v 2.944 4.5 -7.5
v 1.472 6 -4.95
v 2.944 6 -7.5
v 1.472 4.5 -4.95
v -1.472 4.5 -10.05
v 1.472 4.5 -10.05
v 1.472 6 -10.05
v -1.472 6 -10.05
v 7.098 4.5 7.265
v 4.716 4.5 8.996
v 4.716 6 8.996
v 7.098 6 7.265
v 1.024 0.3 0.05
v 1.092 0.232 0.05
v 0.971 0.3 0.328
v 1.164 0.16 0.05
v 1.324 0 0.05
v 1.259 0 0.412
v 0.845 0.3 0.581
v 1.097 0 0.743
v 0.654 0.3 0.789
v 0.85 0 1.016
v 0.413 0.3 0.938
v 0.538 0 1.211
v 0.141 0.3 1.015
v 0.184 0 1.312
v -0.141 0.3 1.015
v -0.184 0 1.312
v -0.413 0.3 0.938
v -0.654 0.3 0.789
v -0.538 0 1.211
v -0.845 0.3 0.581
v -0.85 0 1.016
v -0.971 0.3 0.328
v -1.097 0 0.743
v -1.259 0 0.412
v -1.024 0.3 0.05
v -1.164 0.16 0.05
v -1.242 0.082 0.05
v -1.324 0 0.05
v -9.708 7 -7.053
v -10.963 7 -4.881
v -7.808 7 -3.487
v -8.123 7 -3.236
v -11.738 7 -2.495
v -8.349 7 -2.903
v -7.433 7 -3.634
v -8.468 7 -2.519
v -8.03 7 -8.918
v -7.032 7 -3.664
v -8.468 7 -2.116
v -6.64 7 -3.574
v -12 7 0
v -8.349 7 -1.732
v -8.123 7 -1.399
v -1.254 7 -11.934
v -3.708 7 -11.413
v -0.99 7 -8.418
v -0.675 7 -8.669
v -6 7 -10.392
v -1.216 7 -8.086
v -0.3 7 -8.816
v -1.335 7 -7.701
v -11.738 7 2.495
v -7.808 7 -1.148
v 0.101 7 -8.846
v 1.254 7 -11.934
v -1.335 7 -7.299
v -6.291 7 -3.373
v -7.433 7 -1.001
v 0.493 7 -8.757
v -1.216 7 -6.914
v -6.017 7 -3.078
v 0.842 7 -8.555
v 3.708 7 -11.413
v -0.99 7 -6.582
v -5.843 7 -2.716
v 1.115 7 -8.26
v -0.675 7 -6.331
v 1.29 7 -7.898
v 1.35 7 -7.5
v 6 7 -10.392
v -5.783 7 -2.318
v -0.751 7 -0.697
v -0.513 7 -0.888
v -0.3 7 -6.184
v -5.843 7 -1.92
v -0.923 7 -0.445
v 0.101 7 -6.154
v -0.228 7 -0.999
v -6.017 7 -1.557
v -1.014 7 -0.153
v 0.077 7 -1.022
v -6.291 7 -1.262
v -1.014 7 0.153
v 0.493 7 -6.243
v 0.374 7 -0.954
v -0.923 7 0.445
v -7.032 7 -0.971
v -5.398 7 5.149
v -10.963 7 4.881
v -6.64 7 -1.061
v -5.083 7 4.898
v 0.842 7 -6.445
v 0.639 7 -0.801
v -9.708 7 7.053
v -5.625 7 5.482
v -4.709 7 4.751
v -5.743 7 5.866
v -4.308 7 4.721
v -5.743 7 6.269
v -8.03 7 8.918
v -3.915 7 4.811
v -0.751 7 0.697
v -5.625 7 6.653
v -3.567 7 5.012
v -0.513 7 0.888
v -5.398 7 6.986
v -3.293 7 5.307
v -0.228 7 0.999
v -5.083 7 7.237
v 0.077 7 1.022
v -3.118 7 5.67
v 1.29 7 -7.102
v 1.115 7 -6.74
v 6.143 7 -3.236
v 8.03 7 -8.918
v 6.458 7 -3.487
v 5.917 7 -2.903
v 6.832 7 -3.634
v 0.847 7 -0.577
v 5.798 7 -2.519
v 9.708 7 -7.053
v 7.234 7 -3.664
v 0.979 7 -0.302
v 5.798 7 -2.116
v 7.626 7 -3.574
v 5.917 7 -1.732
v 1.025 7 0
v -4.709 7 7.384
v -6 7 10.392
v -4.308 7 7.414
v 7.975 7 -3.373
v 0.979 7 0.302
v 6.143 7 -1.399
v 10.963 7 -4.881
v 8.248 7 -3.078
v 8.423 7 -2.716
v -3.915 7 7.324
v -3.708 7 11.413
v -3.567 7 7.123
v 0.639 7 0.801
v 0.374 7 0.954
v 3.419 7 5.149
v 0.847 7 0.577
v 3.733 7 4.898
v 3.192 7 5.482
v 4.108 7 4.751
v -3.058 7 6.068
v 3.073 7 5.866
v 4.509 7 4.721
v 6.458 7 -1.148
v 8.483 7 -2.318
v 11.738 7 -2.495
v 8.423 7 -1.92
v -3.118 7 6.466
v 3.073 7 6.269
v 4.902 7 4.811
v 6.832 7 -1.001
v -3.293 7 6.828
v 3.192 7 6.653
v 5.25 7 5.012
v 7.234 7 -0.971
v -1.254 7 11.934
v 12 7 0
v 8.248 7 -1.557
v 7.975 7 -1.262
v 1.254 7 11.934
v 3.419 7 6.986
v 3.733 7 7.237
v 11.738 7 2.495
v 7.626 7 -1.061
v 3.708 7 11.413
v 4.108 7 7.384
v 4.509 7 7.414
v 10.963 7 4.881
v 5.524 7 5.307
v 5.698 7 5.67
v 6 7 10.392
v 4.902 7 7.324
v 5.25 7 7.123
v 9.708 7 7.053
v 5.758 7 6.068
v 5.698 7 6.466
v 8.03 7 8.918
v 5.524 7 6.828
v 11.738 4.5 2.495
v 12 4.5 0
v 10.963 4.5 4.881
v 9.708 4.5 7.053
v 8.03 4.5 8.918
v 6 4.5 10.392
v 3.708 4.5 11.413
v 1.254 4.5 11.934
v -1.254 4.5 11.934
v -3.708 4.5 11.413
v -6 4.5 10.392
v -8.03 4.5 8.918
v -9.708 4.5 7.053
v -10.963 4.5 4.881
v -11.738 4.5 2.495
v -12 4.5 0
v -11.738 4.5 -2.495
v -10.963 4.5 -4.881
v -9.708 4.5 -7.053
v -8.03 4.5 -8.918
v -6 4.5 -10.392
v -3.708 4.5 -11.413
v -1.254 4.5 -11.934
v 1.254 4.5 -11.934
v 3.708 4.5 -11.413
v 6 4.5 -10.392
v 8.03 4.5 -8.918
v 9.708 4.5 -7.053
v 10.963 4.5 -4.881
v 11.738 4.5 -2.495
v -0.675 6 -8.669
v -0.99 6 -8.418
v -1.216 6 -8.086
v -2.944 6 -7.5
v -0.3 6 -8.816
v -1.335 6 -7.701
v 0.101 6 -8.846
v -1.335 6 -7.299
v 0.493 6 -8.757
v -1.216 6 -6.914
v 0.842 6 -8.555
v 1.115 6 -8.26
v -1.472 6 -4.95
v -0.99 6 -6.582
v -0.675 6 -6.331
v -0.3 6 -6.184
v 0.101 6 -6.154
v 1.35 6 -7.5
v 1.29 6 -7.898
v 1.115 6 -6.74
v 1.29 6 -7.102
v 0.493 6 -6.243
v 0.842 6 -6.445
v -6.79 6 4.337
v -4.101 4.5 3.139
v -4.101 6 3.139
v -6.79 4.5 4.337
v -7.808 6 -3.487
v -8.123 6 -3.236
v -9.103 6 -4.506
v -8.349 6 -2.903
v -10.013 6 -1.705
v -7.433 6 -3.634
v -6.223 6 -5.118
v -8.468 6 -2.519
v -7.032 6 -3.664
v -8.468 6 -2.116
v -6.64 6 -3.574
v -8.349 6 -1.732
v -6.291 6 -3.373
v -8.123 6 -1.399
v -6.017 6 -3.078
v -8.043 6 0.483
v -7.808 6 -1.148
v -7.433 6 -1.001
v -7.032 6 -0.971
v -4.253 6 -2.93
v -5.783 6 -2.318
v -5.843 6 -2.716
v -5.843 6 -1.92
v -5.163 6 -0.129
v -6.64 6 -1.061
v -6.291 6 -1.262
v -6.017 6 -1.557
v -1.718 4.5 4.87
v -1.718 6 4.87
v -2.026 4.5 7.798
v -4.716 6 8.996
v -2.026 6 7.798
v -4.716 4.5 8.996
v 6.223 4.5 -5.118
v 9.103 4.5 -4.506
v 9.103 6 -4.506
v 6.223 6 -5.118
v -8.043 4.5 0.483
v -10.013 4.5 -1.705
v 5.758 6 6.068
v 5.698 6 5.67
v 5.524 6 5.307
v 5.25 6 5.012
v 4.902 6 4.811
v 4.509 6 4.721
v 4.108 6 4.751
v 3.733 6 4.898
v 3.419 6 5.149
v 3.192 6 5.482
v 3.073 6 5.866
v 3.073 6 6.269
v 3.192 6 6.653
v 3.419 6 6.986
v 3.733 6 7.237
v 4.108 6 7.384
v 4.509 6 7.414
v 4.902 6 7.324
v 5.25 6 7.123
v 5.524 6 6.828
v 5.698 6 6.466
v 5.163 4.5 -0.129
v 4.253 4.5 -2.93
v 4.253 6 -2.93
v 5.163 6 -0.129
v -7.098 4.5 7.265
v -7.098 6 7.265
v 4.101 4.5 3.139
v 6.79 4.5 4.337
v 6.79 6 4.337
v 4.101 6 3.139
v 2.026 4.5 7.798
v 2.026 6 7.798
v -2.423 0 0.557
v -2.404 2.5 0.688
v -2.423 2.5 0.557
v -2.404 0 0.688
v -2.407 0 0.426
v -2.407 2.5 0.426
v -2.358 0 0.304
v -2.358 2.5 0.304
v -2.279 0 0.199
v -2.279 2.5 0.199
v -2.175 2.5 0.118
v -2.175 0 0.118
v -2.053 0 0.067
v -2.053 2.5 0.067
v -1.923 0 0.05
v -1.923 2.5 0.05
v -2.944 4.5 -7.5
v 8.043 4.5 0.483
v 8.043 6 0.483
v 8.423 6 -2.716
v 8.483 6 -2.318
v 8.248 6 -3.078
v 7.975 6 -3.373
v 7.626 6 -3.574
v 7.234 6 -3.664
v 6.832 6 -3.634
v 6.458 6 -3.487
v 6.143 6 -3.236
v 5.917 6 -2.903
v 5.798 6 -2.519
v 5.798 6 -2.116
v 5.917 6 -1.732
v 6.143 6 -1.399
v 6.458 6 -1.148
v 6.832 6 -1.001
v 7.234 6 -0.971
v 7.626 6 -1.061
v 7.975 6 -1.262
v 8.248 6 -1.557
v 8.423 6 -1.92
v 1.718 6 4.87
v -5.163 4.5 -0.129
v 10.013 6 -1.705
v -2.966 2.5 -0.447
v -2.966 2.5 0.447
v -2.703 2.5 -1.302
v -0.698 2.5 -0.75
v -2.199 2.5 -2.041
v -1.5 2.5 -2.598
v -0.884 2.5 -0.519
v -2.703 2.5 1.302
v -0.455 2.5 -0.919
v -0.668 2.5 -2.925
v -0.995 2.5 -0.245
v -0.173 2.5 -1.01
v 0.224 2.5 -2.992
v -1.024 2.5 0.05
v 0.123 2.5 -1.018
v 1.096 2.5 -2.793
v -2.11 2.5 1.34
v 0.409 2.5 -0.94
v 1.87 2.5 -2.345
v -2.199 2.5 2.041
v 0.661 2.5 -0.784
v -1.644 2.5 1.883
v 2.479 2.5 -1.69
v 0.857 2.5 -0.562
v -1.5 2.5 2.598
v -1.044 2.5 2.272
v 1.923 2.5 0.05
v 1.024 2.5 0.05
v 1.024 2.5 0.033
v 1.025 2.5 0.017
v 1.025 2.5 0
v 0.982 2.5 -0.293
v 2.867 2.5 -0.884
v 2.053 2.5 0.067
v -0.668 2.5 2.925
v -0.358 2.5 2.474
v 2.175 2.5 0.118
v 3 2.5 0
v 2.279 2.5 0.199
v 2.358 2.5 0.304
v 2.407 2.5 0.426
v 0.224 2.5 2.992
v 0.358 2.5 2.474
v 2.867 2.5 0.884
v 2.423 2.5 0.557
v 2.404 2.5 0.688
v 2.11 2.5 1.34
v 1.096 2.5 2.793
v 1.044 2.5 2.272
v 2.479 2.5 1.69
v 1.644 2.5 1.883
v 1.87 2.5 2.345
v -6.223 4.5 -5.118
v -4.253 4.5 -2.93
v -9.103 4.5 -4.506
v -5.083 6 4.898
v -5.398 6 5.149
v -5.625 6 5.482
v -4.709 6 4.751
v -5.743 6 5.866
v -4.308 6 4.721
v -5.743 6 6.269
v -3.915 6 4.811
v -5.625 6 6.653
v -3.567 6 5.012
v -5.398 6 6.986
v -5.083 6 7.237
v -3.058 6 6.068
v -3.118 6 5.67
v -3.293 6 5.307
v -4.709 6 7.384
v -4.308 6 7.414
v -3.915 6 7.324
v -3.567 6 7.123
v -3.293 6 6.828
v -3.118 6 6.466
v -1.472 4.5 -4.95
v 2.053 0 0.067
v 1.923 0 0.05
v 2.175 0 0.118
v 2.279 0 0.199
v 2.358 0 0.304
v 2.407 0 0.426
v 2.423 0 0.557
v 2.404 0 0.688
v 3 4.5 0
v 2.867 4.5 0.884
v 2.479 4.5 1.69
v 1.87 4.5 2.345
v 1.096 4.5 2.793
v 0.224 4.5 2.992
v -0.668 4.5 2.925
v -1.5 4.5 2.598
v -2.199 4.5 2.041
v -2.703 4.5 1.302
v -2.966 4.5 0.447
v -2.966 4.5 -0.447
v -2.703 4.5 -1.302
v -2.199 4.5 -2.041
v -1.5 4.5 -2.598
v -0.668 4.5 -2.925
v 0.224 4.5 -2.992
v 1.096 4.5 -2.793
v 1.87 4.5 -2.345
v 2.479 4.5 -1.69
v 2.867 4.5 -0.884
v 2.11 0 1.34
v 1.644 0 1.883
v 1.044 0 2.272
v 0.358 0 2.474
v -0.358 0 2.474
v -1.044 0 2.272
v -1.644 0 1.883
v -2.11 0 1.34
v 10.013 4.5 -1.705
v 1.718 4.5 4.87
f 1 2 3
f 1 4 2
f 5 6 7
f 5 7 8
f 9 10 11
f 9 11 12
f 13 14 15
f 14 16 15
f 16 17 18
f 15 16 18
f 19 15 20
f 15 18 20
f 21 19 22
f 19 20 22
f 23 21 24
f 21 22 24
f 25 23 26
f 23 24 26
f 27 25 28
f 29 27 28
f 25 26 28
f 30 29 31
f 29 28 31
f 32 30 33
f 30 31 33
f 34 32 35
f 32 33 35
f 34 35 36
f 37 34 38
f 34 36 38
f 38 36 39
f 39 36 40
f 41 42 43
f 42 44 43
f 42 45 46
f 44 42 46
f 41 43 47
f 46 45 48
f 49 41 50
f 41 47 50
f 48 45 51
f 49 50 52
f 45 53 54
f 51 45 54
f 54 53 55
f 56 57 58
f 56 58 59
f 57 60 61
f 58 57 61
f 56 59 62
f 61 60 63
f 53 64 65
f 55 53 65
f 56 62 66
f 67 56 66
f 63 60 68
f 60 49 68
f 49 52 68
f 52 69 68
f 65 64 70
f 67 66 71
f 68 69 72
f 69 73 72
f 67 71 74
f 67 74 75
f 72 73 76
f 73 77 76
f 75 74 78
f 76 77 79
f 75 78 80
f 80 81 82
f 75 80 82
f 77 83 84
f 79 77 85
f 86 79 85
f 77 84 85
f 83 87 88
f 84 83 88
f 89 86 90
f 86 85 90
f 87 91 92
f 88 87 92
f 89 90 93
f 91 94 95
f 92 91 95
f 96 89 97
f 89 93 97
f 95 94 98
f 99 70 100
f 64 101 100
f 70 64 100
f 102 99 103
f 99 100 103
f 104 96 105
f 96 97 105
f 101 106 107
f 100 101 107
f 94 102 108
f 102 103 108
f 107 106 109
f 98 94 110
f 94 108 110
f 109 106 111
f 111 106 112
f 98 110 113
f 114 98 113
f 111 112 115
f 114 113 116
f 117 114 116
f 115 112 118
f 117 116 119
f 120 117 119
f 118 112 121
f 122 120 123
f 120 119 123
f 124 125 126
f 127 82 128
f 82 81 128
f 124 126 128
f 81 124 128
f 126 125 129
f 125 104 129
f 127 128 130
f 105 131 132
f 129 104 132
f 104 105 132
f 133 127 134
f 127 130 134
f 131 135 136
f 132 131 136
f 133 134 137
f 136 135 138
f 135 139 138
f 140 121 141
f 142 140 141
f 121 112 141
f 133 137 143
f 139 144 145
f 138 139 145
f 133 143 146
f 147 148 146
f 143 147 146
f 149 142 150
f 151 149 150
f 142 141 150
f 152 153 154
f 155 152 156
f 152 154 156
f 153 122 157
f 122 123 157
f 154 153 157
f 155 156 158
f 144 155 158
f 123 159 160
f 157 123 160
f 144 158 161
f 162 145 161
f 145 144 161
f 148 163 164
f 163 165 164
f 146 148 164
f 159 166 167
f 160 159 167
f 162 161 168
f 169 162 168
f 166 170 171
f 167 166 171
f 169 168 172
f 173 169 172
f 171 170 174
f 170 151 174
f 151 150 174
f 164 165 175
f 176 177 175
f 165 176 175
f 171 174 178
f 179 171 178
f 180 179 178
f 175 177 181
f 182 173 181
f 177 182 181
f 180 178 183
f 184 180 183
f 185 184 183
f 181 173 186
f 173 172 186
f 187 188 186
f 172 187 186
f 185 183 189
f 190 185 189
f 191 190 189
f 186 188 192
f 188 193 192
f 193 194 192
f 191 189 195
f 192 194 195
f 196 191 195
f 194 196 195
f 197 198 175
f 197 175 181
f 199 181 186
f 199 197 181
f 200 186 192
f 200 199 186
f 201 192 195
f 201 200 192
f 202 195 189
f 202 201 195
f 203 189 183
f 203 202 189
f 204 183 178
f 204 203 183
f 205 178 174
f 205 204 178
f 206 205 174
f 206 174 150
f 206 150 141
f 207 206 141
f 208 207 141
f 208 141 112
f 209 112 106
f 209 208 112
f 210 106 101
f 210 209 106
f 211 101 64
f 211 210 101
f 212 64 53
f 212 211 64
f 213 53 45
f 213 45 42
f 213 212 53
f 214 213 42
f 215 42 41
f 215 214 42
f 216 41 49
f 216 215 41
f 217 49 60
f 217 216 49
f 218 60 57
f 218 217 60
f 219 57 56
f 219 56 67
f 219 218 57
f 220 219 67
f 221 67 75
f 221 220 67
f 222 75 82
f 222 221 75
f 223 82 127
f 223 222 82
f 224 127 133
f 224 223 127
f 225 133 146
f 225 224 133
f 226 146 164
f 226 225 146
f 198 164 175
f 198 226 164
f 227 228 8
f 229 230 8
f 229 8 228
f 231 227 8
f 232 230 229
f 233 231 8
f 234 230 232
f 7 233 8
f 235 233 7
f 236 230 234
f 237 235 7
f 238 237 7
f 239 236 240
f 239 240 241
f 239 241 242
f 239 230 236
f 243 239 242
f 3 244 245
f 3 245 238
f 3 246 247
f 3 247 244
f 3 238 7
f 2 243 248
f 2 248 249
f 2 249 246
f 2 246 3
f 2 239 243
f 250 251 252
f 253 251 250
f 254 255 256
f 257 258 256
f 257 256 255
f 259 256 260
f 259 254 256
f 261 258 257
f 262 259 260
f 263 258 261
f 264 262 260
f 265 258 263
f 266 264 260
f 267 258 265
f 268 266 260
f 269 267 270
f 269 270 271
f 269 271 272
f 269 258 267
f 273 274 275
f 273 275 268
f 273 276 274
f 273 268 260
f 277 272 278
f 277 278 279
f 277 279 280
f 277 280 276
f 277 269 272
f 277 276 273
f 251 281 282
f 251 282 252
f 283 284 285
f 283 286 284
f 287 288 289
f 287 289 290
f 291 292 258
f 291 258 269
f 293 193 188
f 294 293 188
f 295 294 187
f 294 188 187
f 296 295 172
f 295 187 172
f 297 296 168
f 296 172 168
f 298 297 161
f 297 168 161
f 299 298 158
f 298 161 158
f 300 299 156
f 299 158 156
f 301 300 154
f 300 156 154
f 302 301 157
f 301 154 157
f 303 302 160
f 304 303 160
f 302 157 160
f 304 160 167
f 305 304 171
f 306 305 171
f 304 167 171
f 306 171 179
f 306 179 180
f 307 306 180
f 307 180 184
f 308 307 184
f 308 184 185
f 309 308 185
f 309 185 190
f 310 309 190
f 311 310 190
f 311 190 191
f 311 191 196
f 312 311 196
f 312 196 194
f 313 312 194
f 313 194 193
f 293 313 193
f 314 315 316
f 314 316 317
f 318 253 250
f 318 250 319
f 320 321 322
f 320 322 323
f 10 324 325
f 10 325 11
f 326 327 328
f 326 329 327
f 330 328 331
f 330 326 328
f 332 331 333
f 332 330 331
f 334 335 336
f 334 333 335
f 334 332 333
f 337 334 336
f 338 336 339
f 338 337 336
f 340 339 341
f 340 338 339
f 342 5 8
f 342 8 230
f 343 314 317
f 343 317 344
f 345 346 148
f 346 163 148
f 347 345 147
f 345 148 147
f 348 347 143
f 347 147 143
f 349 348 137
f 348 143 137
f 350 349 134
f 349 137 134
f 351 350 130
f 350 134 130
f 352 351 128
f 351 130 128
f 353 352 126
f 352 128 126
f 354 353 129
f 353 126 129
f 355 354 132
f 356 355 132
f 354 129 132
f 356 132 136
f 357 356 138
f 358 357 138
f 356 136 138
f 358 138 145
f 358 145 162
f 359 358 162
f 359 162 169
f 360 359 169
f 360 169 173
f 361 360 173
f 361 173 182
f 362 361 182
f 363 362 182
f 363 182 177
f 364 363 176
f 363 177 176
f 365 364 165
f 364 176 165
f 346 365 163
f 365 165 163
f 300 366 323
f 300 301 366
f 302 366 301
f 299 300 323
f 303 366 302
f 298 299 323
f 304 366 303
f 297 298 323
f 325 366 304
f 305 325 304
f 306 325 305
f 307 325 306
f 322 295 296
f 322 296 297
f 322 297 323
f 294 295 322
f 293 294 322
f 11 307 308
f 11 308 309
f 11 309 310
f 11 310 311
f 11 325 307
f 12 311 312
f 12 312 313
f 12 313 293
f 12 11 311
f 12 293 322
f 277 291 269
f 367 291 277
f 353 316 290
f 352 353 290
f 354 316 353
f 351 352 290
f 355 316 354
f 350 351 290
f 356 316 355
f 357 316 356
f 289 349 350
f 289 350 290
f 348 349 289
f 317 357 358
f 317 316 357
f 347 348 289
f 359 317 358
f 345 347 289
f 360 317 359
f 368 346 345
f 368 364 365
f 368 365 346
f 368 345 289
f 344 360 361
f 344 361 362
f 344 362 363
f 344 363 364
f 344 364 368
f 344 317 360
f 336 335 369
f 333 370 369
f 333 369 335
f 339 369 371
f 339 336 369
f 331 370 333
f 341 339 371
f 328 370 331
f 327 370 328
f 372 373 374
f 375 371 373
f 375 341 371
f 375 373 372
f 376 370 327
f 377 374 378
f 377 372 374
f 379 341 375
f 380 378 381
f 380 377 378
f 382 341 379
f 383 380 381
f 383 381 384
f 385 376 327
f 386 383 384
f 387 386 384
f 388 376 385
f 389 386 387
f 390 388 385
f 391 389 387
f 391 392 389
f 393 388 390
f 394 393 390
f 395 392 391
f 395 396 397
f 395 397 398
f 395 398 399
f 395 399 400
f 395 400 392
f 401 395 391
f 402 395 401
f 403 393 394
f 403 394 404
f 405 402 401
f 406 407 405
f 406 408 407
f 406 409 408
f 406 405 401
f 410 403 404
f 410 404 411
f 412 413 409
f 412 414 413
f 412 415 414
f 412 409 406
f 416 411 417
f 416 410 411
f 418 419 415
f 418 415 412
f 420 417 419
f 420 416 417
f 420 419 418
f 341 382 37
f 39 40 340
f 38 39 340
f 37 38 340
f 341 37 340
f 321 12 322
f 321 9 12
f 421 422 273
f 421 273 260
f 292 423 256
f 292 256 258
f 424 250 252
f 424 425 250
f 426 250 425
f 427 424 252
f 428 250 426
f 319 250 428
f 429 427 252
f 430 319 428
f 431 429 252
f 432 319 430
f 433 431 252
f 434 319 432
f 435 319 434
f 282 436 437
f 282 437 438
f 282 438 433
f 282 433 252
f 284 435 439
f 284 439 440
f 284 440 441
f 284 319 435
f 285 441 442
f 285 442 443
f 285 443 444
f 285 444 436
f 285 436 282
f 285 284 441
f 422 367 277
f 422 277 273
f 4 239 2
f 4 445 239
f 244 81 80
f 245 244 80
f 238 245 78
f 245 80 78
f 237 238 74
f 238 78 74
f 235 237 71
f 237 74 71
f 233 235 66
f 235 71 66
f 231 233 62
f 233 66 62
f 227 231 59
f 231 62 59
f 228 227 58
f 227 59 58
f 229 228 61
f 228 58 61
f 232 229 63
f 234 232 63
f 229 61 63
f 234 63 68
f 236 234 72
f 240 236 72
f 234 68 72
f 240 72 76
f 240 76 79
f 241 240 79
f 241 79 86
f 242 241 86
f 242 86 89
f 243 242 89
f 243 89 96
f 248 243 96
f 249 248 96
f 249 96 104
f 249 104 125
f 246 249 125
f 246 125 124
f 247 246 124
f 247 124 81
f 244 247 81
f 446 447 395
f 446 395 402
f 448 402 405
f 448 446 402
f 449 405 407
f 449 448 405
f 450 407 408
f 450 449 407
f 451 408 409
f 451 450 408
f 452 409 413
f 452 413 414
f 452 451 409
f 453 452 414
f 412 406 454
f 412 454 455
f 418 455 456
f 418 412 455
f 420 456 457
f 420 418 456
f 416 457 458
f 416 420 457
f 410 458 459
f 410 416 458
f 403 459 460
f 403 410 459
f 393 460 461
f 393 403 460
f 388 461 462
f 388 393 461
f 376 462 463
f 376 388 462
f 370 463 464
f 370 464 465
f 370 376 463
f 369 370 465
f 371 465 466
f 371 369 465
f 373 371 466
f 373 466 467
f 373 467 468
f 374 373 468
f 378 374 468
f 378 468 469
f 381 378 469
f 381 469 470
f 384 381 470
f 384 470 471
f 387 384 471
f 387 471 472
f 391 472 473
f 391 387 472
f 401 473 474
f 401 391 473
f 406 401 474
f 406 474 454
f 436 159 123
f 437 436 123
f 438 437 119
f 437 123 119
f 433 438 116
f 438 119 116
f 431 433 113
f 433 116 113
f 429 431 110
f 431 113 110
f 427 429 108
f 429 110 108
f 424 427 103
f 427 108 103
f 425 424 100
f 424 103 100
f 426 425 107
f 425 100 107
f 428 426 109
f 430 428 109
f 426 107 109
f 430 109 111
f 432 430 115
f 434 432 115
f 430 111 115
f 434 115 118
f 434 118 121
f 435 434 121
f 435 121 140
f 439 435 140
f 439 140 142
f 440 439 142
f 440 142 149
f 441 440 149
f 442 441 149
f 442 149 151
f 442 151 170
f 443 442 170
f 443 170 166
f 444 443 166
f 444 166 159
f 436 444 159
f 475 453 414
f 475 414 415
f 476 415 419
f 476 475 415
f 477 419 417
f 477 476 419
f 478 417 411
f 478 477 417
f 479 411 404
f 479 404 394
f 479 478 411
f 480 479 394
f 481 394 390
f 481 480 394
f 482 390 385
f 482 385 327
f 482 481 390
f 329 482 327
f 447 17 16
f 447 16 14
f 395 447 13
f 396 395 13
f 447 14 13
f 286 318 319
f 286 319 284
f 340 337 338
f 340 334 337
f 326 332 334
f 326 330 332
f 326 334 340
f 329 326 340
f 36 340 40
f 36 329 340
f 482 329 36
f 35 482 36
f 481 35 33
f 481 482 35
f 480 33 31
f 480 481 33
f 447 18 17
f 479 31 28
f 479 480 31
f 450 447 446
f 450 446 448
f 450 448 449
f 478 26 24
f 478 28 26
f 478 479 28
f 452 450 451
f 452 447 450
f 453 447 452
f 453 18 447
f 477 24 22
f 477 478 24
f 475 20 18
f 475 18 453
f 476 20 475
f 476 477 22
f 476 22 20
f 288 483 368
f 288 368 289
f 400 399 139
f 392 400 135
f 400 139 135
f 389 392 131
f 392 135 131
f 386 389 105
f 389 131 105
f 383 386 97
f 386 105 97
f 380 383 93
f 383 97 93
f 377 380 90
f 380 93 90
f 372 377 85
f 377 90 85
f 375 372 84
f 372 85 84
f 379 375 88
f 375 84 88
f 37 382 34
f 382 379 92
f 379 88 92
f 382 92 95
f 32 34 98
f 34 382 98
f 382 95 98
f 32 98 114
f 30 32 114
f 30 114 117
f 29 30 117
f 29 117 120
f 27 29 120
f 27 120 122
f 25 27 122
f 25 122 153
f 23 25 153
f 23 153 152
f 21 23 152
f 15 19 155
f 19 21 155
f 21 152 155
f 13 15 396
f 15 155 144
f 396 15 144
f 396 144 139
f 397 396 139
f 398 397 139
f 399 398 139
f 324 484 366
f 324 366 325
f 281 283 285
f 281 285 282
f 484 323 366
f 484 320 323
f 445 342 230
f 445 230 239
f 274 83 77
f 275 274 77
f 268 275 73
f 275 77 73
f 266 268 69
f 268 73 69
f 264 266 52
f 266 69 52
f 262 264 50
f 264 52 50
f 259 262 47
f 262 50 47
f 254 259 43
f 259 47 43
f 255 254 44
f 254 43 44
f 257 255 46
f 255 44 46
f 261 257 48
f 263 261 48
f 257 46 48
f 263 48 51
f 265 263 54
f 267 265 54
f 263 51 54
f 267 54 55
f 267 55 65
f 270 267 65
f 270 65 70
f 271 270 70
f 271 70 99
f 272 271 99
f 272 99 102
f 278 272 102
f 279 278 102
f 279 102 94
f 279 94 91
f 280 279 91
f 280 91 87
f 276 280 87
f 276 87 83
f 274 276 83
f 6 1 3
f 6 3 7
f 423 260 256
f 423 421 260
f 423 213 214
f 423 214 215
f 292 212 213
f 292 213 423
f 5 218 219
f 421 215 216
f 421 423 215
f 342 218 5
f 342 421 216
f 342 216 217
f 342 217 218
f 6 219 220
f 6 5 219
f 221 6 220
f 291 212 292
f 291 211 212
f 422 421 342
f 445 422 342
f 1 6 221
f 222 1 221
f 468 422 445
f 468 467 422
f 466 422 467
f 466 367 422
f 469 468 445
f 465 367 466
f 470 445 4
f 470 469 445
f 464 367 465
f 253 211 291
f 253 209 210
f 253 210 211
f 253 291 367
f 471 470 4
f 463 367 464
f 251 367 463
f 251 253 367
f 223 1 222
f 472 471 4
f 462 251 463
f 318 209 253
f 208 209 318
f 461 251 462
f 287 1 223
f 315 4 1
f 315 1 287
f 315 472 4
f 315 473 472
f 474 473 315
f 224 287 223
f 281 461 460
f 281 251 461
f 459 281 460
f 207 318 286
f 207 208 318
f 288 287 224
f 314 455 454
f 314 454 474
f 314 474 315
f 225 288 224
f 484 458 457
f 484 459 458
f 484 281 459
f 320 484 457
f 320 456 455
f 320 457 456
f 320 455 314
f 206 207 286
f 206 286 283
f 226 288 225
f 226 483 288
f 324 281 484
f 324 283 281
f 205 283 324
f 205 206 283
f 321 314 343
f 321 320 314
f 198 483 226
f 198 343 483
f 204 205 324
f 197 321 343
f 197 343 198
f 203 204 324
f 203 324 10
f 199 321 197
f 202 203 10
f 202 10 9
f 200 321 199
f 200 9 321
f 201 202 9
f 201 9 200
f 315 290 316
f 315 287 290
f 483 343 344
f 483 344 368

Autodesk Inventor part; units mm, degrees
ref_plane "YZ Plane" through (0, 0, 0) normal (1, 0, 0) x (0, 1, 0)
ref_plane "XZ Plane" through (0, 0, 0) normal (0, 1, 0) x (-1, 0, 0)
ref_plane "XY Plane" through (0, 0, 0) normal (0, 0, 1) x (1, 0, 0)
sketch "Sketch1" plane through (0, 0, 0) normal (0, 0, 1) x (1, 0, 0)
  line L0 (0, 7) -> (0, 0) construction
  line L1 (0, 0) -> (1.025, 0) construction
  line L2 (1.025, 0) -> (1.025, 7)
  line L3 (1.025, 7) -> (0, 7) construction
  line L4 (1.025, 7) -> (12, 7)
  line L5 (3, 2.5) -> (2.5, 2.5)
  line L6 (2.5, 2.5) -> (2.5, 0)
  line L7 (2.5, 0) -> (1.025, 0)
  line L8 (12, 7) -> (12, 4.5)
  line L9 (12, 4.5) -> (3, 4.5)
  line L10 (3, 4.5) -> (3, 2.5)
  dimension "d0" = 2.5
  dimension "d1" = 1.025
  dimension "d3" = 0.5
  dimension "d4" = 2.5
  dimension "d9" = 2
  dimension "d10" = 12
  dimension "d11" = 2.5
revolve "Revolution1" add sketch "Sketch1" angle 360 about axis through (0, 7, 0) along (0, -1, 0)
sketch "Sketch2" plane through (0, 7, 0) normal (0, 1, 0) x (1, 0, 0)
  line L0 (0, 0) -> (0, 7.5) construction
  circle A0 centre (0, 7.5) radius 1.35
  line L1 (0, 0) -> (-7.1329, 2.3176) construction
  circle A1 centre (-7.1329, 2.3176) radius 1.35
  line L2 (0, 0) -> (-4.4084, -6.0676) construction
  circle A2 centre (-4.4084, -6.0676) radius 1.35
  line L3 (0, 0) -> (4.4084, -6.0676) construction
  circle A3 centre (4.4084, -6.0676) radius 1.35
  line L4 (0, 0) -> (7.1329, 2.3176) construction
  circle A4 centre (7.1329, 2.3176) radius 1.35
  dimension "d12" = 7.5
  dimension "d13" = 2.7
  dimension "d16" = 360
extrude "Extrusion1" cut sketch "Sketch2" against normal blind 10
sketch "Sketch3" plane through (0, 4.5, 0) normal (0, -1, 0) x (1, 0, 0)
  circle A0 centre (0, -7.5) radius 1.35 construction
  line L0 (-2.9445, -7.5) -> (-1.4722, -4.95)
  line L1 (-1.4722, -4.95) -> (1.4722, -4.95)
  line L2 (1.4722, -4.95) -> (2.9445, -7.5)
  line L3 (2.9445, -7.5) -> (1.4722, -10.05)
  line L4 (1.4722, -10.05) -> (-1.4722, -10.05)
  line L5 (-1.4722, -10.05) -> (-2.9445, -7.5)
  line L6 (6.223, -5.118) -> (4.2528, -2.9298)
  line L7 (4.2528, -2.9298) -> (5.1627, -0.1294)
  line L8 (5.1627, -0.1294) -> (8.0428, 0.4827)
  line L9 (8.0428, 0.4827) -> (10.0131, -1.7054)
  line L10 (10.0131, -1.7054) -> (9.1032, -4.5058)
  line L11 (9.1032, -4.5058) -> (6.223, -5.118)
  line L12 (6.7905, 4.3369) -> (4.1006, 3.1393)
  line L13 (4.1006, 3.1393) -> (1.7185, 4.87)
  line L14 (1.7185, 4.87) -> (2.0262, 7.7984)
  line L15 (2.0262, 7.7984) -> (4.7162, 8.996)
  line L16 (4.7162, 8.996) -> (7.0983, 7.2653)
  line L17 (7.0983, 7.2653) -> (6.7905, 4.3369)
  line L18 (-2.0262, 7.7984) -> (-1.7185, 4.87)
  line L19 (-1.7185, 4.87) -> (-4.1006, 3.1393)
  line L20 (-4.1006, 3.1393) -> (-6.7905, 4.3369)
  line L21 (-6.7905, 4.3369) -> (-7.0983, 7.2653)
  line L22 (-7.0983, 7.2653) -> (-4.7162, 8.996)
  line L23 (-4.7162, 8.996) -> (-2.0262, 7.7984)
  line L24 (-8.0428, 0.4827) -> (-5.1627, -0.1294)
  line L25 (-5.1627, -0.1294) -> (-4.2528, -2.9298)
  line L26 (-4.2528, -2.9298) -> (-6.223, -5.118)
  line L27 (-6.223, -5.118) -> (-9.1032, -4.5058)
  line L28 (-9.1032, -4.5058) -> (-10.0131, -1.7054)
  line L29 (-10.0131, -1.7054) -> (-8.0428, 0.4827)
  point P0 (0, 0)
  point P1 (0, -7.5)
  point P2 (7.1329, -2.3176)
  point P3 (7.1329, -2.3176)
  point P4 (4.4084, 6.0676)
  point P5 (4.4084, 6.0676)
  point P6 (-4.4084, 6.0676)
  point P7 (-4.4084, 6.0676)
  point P8 (-7.1329, -2.3176)
  point P9 (-7.1329, -2.3176)
  dimension "d20" = 5.1
  dimension "d23" = 360
extrude "Extrusion2" cut sketch "Sketch3" against normal blind 1.5
chamfer "Chamfer2" distance 0.3 angle 45 1 edges at (-1.025, 0, 0)
sketch "Sketch4" plane through (0, 0, 0) normal (0, -1, 0) x (1, 0, 0)
  line L0 (-3.3003, 0.05) -> (-3.3003, -4.3195)
  line L1 (-3.3003, -4.3195) -> (3.3085, -4.3195)
  line L2 (3.3085, -4.3195) -> (3.3085, 0.05)
  line L3 (3.3085, 0.05) -> (-3.3003, 0.05)
  point P0 (0, 0)
  point P1 (0, 0)
  dimension "d32" = 0.05
extrude "Extrusion3" cut sketch "Sketch4" against normal up to surface (2.5 mm away)
fillet "Fillet1" radius 0.5 2 edges at (2.4995, 1.25, 0.05) (-2.4995, 1.25, 0.05)
properties part number "Flywheel"
